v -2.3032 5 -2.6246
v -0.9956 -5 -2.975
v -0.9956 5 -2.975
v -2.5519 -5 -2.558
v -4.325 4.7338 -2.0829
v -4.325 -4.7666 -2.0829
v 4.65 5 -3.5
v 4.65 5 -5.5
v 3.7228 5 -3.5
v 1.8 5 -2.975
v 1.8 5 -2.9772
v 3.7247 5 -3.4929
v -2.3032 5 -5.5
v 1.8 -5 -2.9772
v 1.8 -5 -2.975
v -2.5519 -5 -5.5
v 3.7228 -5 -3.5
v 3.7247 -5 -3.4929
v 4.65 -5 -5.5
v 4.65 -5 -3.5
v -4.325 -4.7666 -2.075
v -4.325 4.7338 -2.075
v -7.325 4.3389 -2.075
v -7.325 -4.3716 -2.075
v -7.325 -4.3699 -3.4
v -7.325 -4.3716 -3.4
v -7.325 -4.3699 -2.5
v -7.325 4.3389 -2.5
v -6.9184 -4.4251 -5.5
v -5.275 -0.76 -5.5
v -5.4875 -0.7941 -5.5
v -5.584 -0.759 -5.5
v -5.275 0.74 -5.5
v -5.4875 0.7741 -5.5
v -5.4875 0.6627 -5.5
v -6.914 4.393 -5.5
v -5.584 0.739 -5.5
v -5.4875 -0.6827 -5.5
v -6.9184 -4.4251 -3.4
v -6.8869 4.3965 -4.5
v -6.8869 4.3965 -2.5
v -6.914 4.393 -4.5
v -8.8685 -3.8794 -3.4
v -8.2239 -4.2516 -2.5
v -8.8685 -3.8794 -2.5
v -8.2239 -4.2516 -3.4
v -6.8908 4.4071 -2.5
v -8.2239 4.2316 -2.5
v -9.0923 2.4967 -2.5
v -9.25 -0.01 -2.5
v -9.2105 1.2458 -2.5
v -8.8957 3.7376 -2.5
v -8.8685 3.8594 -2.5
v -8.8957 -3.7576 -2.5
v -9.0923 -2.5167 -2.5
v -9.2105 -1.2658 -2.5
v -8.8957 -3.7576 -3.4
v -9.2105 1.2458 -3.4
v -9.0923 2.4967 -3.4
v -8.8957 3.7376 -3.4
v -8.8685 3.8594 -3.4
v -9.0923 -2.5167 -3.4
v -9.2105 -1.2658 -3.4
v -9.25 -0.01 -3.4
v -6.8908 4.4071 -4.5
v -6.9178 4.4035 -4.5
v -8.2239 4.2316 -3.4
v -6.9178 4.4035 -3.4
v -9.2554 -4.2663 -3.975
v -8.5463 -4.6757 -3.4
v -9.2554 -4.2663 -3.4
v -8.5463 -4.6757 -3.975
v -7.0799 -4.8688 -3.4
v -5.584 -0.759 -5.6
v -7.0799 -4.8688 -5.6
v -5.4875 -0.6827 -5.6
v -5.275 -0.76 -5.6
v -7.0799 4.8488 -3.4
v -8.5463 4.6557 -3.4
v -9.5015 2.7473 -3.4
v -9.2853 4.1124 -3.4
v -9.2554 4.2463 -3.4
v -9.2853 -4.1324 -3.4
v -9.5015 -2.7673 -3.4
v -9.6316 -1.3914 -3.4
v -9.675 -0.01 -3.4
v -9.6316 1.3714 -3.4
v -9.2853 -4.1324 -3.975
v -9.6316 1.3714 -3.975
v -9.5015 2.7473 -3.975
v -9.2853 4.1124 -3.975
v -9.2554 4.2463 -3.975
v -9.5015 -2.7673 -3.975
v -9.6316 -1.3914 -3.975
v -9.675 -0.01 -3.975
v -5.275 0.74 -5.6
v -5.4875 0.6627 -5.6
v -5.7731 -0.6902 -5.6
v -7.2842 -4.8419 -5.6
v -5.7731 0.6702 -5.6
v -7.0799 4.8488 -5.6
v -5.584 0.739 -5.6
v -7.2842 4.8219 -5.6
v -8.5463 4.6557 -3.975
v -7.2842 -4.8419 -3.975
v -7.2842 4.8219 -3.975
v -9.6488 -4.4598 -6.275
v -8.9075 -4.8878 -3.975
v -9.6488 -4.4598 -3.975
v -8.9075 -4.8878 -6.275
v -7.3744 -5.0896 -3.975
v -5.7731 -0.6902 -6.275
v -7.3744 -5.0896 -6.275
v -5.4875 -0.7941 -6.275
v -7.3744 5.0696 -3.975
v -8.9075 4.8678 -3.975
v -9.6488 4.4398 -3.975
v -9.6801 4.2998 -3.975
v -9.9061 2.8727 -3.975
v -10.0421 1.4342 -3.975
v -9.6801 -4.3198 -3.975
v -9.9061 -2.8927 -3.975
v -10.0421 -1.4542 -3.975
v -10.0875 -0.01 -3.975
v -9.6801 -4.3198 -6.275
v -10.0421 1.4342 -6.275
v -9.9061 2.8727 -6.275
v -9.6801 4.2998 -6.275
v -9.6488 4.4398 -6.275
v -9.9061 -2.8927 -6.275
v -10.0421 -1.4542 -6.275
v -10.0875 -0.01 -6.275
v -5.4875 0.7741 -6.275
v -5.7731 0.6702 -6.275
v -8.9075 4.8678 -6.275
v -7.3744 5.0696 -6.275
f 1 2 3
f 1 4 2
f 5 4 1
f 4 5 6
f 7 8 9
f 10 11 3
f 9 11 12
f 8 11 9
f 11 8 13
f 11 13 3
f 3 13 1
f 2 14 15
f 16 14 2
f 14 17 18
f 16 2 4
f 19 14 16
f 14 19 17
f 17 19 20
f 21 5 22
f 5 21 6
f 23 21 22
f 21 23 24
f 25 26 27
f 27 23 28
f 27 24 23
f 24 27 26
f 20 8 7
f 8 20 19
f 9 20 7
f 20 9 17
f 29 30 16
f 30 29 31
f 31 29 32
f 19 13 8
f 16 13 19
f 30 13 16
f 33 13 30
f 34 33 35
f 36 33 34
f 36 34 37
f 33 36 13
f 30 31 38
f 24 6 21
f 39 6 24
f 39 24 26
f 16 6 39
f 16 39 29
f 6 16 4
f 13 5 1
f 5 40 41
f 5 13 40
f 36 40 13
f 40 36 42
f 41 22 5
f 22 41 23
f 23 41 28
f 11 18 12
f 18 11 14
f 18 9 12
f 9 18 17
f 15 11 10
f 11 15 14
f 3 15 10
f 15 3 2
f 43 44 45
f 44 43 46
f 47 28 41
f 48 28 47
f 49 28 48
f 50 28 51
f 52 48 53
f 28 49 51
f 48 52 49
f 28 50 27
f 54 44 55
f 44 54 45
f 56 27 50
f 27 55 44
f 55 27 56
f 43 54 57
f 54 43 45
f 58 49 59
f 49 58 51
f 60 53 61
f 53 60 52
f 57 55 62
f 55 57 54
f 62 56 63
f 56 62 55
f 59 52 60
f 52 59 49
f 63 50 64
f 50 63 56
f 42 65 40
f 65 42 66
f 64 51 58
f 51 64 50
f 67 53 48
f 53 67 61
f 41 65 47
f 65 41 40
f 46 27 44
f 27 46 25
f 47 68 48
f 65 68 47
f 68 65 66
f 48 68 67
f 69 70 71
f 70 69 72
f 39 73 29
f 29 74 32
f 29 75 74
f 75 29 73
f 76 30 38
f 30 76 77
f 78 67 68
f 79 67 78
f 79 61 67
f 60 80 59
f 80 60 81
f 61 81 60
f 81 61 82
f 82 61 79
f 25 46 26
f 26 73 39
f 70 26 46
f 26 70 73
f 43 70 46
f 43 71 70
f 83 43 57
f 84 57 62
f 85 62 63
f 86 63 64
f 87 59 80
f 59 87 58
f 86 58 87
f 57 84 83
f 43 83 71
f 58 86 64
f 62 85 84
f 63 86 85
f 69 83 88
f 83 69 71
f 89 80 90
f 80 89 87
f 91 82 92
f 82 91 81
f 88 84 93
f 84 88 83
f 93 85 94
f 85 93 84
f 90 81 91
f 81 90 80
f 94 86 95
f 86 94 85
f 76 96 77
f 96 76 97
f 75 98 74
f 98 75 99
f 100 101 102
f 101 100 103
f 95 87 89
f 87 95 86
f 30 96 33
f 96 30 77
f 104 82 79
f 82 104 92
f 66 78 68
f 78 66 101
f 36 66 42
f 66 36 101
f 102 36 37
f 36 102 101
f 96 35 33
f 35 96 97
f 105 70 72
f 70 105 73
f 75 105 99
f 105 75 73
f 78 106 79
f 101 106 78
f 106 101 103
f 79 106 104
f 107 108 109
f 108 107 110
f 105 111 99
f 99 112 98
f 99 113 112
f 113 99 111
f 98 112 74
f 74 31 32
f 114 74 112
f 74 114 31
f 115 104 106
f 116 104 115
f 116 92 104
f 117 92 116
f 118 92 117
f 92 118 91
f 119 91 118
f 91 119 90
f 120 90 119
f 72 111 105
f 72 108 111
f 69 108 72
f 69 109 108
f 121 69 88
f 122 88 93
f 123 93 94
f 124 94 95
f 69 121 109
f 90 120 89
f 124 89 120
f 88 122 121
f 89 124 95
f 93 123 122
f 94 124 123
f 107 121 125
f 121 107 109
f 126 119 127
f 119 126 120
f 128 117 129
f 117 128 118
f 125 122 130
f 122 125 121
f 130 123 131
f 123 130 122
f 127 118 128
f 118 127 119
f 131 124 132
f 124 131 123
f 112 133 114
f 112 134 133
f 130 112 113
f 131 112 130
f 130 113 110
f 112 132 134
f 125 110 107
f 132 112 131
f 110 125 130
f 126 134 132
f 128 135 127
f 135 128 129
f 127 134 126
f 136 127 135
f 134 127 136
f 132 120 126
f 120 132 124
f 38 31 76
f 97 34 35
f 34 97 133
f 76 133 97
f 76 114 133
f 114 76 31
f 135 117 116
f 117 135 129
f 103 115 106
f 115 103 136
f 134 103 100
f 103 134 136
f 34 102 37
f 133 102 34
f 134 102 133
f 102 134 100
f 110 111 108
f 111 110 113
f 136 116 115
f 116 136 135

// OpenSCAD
standardfn=50;
$fn=standardfn; //renders with 50 faces per object
s1m=3.1; //multiplier for the shells
buffer=0.99; //universial 
buffer2=1.5; //buffer for the shell depth
radiuss1=10; //radius for the first shell
radiuss2=10; //radius for the second shell
radius=10;
color="#758C7C";
color2="#B6BCBD";
 
module shell1(radius) { // Renders a shell
    difference() {
        balls(radius);
        translate([0,0,-11]) 
            cube([20,20,15], center = true);
        translate([-10*s1m+5,0,-10])
            sphere(r=radius*s1m);
    }      
}
module cutout(radius) { //cutout to make the shell hollow
    color(color) {
        scale([0.9,0.9,0.9]) translate([6.5,0,0]) {
            intersection() {
                translate([-10*s1m,0,-10])
                    sphere(r=10*s1m);
                translate([-7,0,0])
                    shell1(radiuss2);
            }
        }
    }
}
module balls(ra) { //renders 2 balls in an intersection
    color(color2)
    intersection() {
            translate([0,ra / 2,0])
                sphere(r=ra);
            translate([0,-ra / 2,0])
                sphere(r=ra);
        }
}
module transition() {
    scale([0.39,0.39,0.39]) rotate([20,-5,30]) translate([-8,6,-18])
        union() {
            difference() {
                difference() {
                    sphere(20);
                    sphere(20-2);
                }
                rotate([0,0,45]) translate([-20,0,-20])
                    cube([40,40,40]);
                translate([0,-20,-20])
                    cube([40,40,40]);
                difference() {
                    sphere(30);
                    translate([-40,-40,10])
                        cube([80,80,80]);
                }
                translate([0,0,0])
                    cube([15,15,15]);
            }
        }
}
module f1inside(x) {
    translate([x,2.15,-1.5]) rotate([0,0,-15])
        cube([2,5,5], center=true);
    translate([x,-2.15,-1.5]) rotate([0,0,15])
        cube([2,5,5], center=true);
}
module f2inside(x) {
    translate([-1.7,0,-5.2]) rotate([0,45,0]) {
        translate([x,1.3,-1.5]) rotate([0,0,-15])
            cube([2,3.25,2], center=true);
        translate([x,-1.3,-1.5]) rotate([0,0,15])
            cube([2,3.25,2], center=true);
    }
    difference() {
        translate([x+15.6,0,2.1]) rotate([0,-15,0]) {
            difference() {
                cylinder(r=20, h=1, $fn=100);
                translate([x+10,0,0.5])
                    cube([40,42,1.6], center=true);
                translate([x-13,10,0.5]) rotate([0,0,120])
                    cube([10,10,1.6], center=true);
                translate([x-7.26,7,0.5]) rotate([0,0,20])
                    cube([10,10,1.6], center=true);
                mirror([0,1,0]) {
                    translate([x-13,10,0.5]) rotate([0,0,120])
                        cube([10,10,1.6], center=true);
                    translate([x-7.26,7,0.5]) rotate([0,0,20])
                        cube([10,10,1.6], center=true);
                }
            }
        }
        translate([-10,-5.8,-3.8]) rotate([20,0,-7.5]) {
            color("#B8A693") cube([4,2,2]);
        }
        mirror([0,1,0])
            translate([-10,-5.8,-3.8]) rotate([20,0,-7.5]) {
                color("#B8A693") cube([4,2,2]);
            }
    }
}
module binside(x) {
    translate([x-0.5,-1,-4]) rotate([0,0,-5])
        cube([2,5,6]);
    translate([x,-5.5,-4]) rotate([0,-10,-5])
        cube([2,5,6]);
}
module roof() {
    difference() { //first shell
        color(color2) shell1(radiuss1);
        cutout(radiuss1-0.75);
        mirror([0,1,0]) {
            cutout(radiuss1-0.75);
        }
    }
    translate([-4,0,-3.4]) rotate([0,-2.5,0])
        difference() { //second shell
            color(color2) shell1(radiuss2);
            cutout(radiuss1-0.75);
            mirror([0,1,0]) {
                cutout(radiuss1-0.75);
            }
        }
    translate([-7.5,0,-6.5]) rotate([0,-5,0])
        difference() { //third shell
            color(color2) shell1(radiuss2);
            translate([0.79,0,0]) {
                cutout(radiuss1-0.75);
                mirror([0,1,0]) {
                    cutout(radiuss1-0.75);
                }
            }
        }
    translate([14,0,-6]) rotate([0,-5,180]) scale([1,0.8,1])
        difference() { //back shell (from biggest shell)
            color(color2) shell1(radiuss2);
            scale([0.9,0.9,0.9])
                balls(10);
        }
    scale([1,0.8,1]) translate([7.2,0,-2]) rotate([0,5,0])
            difference() { //first transition from biggest to middle shell / inside
                color(color2) mirror([1,0,0]) shell1(radiuss2);
                translate([4,0,4])
                    cube([13,13,13], center=true);  
            }
    scale([1,0.8,1]) translate([2,0,-5]) rotate([0,5,0])
            difference() { //second transition from middle to smallest shell / inside
                color(color2) mirror([1,0,0]) shell1(radiuss2);
                translate([4,0,4])
                    cube([13,13,13], center=true);  
            }
    color(color2) transition();              //transition bottom shell / sides
    mirror([0,1,0])  {                         
        color(color2) transition();
    }
    scale([1,1,1.25]) translate([5,-0.4,0]) { //transition top shell / sides
        translate([-0.1,0.3,1.5]) rotate([10,-3,6])
            color(color2) transition();
        mirror([0,1,0]) {
            translate([-0.1,-0.3,1.5]) rotate([10,-3,6]) 
                color(color2) transition();
       }
    }
    translate([10,0,-1]) {
        rotate([-15,20,-20]) translate([1,-1,-0.5]) scale([0.7,0.7,1]) {
            color(color2) transition();     //transition back shell left / sides
        }
        rotate([-5,-5,0]) translate([1.4,-0.7,0]) scale([0.7,0.7,1]) {
            color(color2) transition();     //transition back shell left/ sides
        }
    }
    translate([10,0,-1]) mirror([0,1,0]) {
        rotate([-15,20,-20]) translate([1,-1,-0.5]) scale([0.7,0.7,1]) {
            color(color2) transition();     //transition back shell right / sides
        }
        rotate([-5,-5,0]) translate([1.4,-0.7,0]) scale([0.7,0.7,1]) {
            color(color2) transition();     //transition back shell right/ sides
        }
    }
    color(color) {
        translate([0.5,0,0]) {
            intersection() {  //front shell inside
                translate([-8.5,0,-6]) scale([0.89,0.89,0.89])
                    balls(10);
                    f1inside(-6);
            }
            f2inside(-6);
        }
    }
    color(color)  {
        intersection() { //back shell inside
            binside(10);
                translate([14,0,-6]) scale([0.89,0.79,0.89])
                    balls(10);
        }
    }
}
module bottom(x, depth) {
    translate([0,0,-8.5]) rotate([0,0,0]) color("#B8A693"){
        translate([2.5,0,4.3]) rotate([0,15,0])
            cube([2, 10, 2], center=true);
            translate([-0.2,0,4.525]) rotate([0,0,0])
                cube([4, 10, 2], center=true);
        difference() {
            union() {
                translate([-2.9,0,5]) rotate([0,15,0])
                    cube([3.5, 10, 2], center=true);
                translate([-5.825,0,5.425]) rotate([0,0,0])
                    cube([3, 10, 2], center=true);
                translate([-7.35,-5,3])
                    cube([12,10,2]);
            }
                translate([-8,-6.3,2.5]) rotate([0,0,-7.5]) 
                    cube([7.5,2,4]);
                translate([-8,4.25,2.5]) rotate([0,0,7.5]) 
                    cube([7.5,2,4]);        
        }
    }
    translate([0,-0.01,-1]) {
        difference() {
            translate([x+16.75,0,-3.5]) rotate([0,0,0]) {
                color("#B8A693") difference() {
                    cylinder(r=20, h=2, $fn=100);
                    translate([x+10,0,1])
                        cube([40,42,4], center=true);
                    translate([x-13,10,0.5]) rotate([0,0,120])
                        cube([10,10,4], center=true);
                    translate([x-7.26,7,0.5]) rotate([0,0,20])
                        cube([10,10,4], center=true);
                    mirror([0,1,0]) {
                        translate([x-13,10,0.5]) rotate([0,0,120])
                            cube([10,10,4], center=true);
                        translate([x-7.26,7,0.5]) rotate([0,0,20])
                            cube([10,10,4], center=true);
                    }
                }
            }
            
            translate([-10,-6.025,-5]) rotate([0,0,-7.5]) {
                color("#B8A693") cube([4,2,4]);
            }
            mirror([0,1,0]) {
                translate([-10,-6.025,-5]) rotate([0,0,-7.5]) {
                    color("#B8A693") cube([4,2,4]);
                }
            }
        }
    }
    difference() {
        translate([0.5,-0.01,-1.75]) scale([1.1,1.1,1.1]) {
            difference() {
                translate([x+16.75,0,-3.5]) rotate([0,0,0]) {
                    color("#B8A693") difference() {
                        cylinder(r=20, h=2, $fn=100);
                        translate([x+10,0,1])
                            cube([40,42,4], center=true);
                        translate([x-13,10,0.5]) rotate([0,0,120])
                            cube([10,10,4], center=true);
                        translate([x-7.26,7,0.5]) rotate([0,0,20])
                            cube([10,10,4], center=true);
                        mirror([0,1,0]) {
                            translate([x-13,10,0.5]) rotate([0,0,120])
                                cube([10,10,4], center=true);
                            translate([x-7.26,7,0.5]) rotate([0,0,20])
                                cube([10,10,4], center=true);
                        }
                    }
                }
                
                translate([-10,-6.025,-5]) rotate([0,0,-7.5]) {
                    color("#B8A693") cube([4,2,4]);
                }
                mirror([0,1,0]) {
                    translate([-10,-6.025,-5]) rotate([0,0,-7.5]) {
                        color("#B8A693") cube([4,2,4]);
                    }
                }
            }
        }
        #translate([0.5,-0.01,-1.75]) scale([depth,depth,depth]) {
            difference() {
                translate([x+16.75,0,-3.5]) rotate([0,0,0]) {
                    color("#B8A693") difference() {
                        cylinder(r=20, h=2, $fn=100);
                        translate([x+10,0,1])
                            cube([40,42,4], center=true);
                        translate([x-13,10,0.5]) rotate([0,0,120])
                            cube([10,10,4], center=true);
                        translate([x-7.26,7,0.5]) rotate([0,0,20])
                            cube([10,10,4], center=true);
                        mirror([0,1,0]) {
                            translate([x-13,10,0.5]) rotate([0,0,120])
                                cube([10,10,4], center=true);
                            translate([x-7.26,7,0.5]) rotate([0,0,20])
                                cube([10,10,4], center=true);
                        }
                    }
                }
                
                translate([-10,-6.025,-5]) rotate([0,0,-7.5]) {
                    color("#B8A693") cube([4,2,4]);
                }
                mirror([0,1,0]) {
                    translate([-10,-6.025,-5]) rotate([0,0,-7.5]) {
                        color("#B8A693") cube([4,2,4]);
                    }
                }
            }
        }
    }
    translate([0.55,-0.01,-2.25]) scale([1.15,1.15,1.15]) {
        difference() {
            translate([x+16.75,0,-3.5]) rotate([0,0,0]) {
                color("#B8A693") difference() {
                    cylinder(r=20, h=2, $fn=100);
                    translate([x+10,0,1])
                        cube([40,42,4], center=true);
                    translate([x-13,10,0.5]) rotate([0,0,120])
                        cube([10,10,4], center=true);
                    translate([x-7.26,7,0.5]) rotate([0,0,20])
                        cube([10,10,4], center=true);
                    mirror([0,1,0]) {
                        translate([x-13,10,0.5]) rotate([0,0,120])
                            cube([10,10,4], center=true);
                        translate([x-7.26,7,0.5]) rotate([0,0,20])
                            cube([10,10,4], center=true);
                    }
                }
            }
            
            translate([-10,-6.025,-5]) rotate([0,0,-7.5]) {
                color("#B8A693") cube([4,2,4]);
            }
            mirror([0,1,0]) {
                translate([-10,-6.025,-5]) rotate([0,0,-7.5]) {
                    color("#B8A693") cube([4,2,4]);
                }
            }
        }
    }
} 
module ground() {
     difference() {
        translate([7,2.5,-6]) rotate([0,0,90]) //bottom plate
            color("#6D675A") cube([22.5,35,2], center=true);
        translate([-9,14,-6]) rotate([0,0,0]) 
            color("#6D675A") cube([6,6,3], center=true);
     }
     translate([-7,3,-7]) rotate([0,0,0]) //cylinder
        color("#6D675A") cylinder(h=2, r=9, $fn=100);
     translate([0,-4.45,-5.5]) rotate([0,0,0]) //ground plate 
        color("#B8A693") cube([15,17.75,2]);
     translate([-6,11.28,-6]) rotate([0,0,15]) //cylinder addon
        color("#6D675A") cube([6,2.5,2], center=true);
     translate([-3,12.5,-6]) rotate([0,0,0]) //ground plate addon
        color("#6D675A") cube([6,4,2], center=true);
     translate([2.7,12.125,-6]) rotate([0,0,-7.5]) //ground plate addon
        color("#6D675A") cube([6,4,2], center=true);
}
module hall1() {
    difference() {
        roof();
        translate([0,0,-8.5]) rotate([0,0,0]) {
            cube([30,20,10], center=true);
            translate([2.5,0,4.3]) rotate([0,15,0])
                cube([2, 20, 2], center=true);
            translate([-3.2,0,4.525]) rotate([0,0,0])
                cube([10, 20, 2], center=true);
            translate([-2.9,0,5]) rotate([0,15,0])
                cube([3.5, 20, 2], center=true);
            translate([-5.825,0,5.425]) rotate([0,0,0])
                cube([3, 20, 2], center=true);
        }
    } 
    bottom(-6,1);
}
/* 
rotate([0,0,10])
    hall1();
*/
/*
rotate([0,0,-10]) translate([-2.5,10,-1]) scale([0.7,0.7,0.7])
    hall1();
*/
bottom(-6,0.95)
ground();
